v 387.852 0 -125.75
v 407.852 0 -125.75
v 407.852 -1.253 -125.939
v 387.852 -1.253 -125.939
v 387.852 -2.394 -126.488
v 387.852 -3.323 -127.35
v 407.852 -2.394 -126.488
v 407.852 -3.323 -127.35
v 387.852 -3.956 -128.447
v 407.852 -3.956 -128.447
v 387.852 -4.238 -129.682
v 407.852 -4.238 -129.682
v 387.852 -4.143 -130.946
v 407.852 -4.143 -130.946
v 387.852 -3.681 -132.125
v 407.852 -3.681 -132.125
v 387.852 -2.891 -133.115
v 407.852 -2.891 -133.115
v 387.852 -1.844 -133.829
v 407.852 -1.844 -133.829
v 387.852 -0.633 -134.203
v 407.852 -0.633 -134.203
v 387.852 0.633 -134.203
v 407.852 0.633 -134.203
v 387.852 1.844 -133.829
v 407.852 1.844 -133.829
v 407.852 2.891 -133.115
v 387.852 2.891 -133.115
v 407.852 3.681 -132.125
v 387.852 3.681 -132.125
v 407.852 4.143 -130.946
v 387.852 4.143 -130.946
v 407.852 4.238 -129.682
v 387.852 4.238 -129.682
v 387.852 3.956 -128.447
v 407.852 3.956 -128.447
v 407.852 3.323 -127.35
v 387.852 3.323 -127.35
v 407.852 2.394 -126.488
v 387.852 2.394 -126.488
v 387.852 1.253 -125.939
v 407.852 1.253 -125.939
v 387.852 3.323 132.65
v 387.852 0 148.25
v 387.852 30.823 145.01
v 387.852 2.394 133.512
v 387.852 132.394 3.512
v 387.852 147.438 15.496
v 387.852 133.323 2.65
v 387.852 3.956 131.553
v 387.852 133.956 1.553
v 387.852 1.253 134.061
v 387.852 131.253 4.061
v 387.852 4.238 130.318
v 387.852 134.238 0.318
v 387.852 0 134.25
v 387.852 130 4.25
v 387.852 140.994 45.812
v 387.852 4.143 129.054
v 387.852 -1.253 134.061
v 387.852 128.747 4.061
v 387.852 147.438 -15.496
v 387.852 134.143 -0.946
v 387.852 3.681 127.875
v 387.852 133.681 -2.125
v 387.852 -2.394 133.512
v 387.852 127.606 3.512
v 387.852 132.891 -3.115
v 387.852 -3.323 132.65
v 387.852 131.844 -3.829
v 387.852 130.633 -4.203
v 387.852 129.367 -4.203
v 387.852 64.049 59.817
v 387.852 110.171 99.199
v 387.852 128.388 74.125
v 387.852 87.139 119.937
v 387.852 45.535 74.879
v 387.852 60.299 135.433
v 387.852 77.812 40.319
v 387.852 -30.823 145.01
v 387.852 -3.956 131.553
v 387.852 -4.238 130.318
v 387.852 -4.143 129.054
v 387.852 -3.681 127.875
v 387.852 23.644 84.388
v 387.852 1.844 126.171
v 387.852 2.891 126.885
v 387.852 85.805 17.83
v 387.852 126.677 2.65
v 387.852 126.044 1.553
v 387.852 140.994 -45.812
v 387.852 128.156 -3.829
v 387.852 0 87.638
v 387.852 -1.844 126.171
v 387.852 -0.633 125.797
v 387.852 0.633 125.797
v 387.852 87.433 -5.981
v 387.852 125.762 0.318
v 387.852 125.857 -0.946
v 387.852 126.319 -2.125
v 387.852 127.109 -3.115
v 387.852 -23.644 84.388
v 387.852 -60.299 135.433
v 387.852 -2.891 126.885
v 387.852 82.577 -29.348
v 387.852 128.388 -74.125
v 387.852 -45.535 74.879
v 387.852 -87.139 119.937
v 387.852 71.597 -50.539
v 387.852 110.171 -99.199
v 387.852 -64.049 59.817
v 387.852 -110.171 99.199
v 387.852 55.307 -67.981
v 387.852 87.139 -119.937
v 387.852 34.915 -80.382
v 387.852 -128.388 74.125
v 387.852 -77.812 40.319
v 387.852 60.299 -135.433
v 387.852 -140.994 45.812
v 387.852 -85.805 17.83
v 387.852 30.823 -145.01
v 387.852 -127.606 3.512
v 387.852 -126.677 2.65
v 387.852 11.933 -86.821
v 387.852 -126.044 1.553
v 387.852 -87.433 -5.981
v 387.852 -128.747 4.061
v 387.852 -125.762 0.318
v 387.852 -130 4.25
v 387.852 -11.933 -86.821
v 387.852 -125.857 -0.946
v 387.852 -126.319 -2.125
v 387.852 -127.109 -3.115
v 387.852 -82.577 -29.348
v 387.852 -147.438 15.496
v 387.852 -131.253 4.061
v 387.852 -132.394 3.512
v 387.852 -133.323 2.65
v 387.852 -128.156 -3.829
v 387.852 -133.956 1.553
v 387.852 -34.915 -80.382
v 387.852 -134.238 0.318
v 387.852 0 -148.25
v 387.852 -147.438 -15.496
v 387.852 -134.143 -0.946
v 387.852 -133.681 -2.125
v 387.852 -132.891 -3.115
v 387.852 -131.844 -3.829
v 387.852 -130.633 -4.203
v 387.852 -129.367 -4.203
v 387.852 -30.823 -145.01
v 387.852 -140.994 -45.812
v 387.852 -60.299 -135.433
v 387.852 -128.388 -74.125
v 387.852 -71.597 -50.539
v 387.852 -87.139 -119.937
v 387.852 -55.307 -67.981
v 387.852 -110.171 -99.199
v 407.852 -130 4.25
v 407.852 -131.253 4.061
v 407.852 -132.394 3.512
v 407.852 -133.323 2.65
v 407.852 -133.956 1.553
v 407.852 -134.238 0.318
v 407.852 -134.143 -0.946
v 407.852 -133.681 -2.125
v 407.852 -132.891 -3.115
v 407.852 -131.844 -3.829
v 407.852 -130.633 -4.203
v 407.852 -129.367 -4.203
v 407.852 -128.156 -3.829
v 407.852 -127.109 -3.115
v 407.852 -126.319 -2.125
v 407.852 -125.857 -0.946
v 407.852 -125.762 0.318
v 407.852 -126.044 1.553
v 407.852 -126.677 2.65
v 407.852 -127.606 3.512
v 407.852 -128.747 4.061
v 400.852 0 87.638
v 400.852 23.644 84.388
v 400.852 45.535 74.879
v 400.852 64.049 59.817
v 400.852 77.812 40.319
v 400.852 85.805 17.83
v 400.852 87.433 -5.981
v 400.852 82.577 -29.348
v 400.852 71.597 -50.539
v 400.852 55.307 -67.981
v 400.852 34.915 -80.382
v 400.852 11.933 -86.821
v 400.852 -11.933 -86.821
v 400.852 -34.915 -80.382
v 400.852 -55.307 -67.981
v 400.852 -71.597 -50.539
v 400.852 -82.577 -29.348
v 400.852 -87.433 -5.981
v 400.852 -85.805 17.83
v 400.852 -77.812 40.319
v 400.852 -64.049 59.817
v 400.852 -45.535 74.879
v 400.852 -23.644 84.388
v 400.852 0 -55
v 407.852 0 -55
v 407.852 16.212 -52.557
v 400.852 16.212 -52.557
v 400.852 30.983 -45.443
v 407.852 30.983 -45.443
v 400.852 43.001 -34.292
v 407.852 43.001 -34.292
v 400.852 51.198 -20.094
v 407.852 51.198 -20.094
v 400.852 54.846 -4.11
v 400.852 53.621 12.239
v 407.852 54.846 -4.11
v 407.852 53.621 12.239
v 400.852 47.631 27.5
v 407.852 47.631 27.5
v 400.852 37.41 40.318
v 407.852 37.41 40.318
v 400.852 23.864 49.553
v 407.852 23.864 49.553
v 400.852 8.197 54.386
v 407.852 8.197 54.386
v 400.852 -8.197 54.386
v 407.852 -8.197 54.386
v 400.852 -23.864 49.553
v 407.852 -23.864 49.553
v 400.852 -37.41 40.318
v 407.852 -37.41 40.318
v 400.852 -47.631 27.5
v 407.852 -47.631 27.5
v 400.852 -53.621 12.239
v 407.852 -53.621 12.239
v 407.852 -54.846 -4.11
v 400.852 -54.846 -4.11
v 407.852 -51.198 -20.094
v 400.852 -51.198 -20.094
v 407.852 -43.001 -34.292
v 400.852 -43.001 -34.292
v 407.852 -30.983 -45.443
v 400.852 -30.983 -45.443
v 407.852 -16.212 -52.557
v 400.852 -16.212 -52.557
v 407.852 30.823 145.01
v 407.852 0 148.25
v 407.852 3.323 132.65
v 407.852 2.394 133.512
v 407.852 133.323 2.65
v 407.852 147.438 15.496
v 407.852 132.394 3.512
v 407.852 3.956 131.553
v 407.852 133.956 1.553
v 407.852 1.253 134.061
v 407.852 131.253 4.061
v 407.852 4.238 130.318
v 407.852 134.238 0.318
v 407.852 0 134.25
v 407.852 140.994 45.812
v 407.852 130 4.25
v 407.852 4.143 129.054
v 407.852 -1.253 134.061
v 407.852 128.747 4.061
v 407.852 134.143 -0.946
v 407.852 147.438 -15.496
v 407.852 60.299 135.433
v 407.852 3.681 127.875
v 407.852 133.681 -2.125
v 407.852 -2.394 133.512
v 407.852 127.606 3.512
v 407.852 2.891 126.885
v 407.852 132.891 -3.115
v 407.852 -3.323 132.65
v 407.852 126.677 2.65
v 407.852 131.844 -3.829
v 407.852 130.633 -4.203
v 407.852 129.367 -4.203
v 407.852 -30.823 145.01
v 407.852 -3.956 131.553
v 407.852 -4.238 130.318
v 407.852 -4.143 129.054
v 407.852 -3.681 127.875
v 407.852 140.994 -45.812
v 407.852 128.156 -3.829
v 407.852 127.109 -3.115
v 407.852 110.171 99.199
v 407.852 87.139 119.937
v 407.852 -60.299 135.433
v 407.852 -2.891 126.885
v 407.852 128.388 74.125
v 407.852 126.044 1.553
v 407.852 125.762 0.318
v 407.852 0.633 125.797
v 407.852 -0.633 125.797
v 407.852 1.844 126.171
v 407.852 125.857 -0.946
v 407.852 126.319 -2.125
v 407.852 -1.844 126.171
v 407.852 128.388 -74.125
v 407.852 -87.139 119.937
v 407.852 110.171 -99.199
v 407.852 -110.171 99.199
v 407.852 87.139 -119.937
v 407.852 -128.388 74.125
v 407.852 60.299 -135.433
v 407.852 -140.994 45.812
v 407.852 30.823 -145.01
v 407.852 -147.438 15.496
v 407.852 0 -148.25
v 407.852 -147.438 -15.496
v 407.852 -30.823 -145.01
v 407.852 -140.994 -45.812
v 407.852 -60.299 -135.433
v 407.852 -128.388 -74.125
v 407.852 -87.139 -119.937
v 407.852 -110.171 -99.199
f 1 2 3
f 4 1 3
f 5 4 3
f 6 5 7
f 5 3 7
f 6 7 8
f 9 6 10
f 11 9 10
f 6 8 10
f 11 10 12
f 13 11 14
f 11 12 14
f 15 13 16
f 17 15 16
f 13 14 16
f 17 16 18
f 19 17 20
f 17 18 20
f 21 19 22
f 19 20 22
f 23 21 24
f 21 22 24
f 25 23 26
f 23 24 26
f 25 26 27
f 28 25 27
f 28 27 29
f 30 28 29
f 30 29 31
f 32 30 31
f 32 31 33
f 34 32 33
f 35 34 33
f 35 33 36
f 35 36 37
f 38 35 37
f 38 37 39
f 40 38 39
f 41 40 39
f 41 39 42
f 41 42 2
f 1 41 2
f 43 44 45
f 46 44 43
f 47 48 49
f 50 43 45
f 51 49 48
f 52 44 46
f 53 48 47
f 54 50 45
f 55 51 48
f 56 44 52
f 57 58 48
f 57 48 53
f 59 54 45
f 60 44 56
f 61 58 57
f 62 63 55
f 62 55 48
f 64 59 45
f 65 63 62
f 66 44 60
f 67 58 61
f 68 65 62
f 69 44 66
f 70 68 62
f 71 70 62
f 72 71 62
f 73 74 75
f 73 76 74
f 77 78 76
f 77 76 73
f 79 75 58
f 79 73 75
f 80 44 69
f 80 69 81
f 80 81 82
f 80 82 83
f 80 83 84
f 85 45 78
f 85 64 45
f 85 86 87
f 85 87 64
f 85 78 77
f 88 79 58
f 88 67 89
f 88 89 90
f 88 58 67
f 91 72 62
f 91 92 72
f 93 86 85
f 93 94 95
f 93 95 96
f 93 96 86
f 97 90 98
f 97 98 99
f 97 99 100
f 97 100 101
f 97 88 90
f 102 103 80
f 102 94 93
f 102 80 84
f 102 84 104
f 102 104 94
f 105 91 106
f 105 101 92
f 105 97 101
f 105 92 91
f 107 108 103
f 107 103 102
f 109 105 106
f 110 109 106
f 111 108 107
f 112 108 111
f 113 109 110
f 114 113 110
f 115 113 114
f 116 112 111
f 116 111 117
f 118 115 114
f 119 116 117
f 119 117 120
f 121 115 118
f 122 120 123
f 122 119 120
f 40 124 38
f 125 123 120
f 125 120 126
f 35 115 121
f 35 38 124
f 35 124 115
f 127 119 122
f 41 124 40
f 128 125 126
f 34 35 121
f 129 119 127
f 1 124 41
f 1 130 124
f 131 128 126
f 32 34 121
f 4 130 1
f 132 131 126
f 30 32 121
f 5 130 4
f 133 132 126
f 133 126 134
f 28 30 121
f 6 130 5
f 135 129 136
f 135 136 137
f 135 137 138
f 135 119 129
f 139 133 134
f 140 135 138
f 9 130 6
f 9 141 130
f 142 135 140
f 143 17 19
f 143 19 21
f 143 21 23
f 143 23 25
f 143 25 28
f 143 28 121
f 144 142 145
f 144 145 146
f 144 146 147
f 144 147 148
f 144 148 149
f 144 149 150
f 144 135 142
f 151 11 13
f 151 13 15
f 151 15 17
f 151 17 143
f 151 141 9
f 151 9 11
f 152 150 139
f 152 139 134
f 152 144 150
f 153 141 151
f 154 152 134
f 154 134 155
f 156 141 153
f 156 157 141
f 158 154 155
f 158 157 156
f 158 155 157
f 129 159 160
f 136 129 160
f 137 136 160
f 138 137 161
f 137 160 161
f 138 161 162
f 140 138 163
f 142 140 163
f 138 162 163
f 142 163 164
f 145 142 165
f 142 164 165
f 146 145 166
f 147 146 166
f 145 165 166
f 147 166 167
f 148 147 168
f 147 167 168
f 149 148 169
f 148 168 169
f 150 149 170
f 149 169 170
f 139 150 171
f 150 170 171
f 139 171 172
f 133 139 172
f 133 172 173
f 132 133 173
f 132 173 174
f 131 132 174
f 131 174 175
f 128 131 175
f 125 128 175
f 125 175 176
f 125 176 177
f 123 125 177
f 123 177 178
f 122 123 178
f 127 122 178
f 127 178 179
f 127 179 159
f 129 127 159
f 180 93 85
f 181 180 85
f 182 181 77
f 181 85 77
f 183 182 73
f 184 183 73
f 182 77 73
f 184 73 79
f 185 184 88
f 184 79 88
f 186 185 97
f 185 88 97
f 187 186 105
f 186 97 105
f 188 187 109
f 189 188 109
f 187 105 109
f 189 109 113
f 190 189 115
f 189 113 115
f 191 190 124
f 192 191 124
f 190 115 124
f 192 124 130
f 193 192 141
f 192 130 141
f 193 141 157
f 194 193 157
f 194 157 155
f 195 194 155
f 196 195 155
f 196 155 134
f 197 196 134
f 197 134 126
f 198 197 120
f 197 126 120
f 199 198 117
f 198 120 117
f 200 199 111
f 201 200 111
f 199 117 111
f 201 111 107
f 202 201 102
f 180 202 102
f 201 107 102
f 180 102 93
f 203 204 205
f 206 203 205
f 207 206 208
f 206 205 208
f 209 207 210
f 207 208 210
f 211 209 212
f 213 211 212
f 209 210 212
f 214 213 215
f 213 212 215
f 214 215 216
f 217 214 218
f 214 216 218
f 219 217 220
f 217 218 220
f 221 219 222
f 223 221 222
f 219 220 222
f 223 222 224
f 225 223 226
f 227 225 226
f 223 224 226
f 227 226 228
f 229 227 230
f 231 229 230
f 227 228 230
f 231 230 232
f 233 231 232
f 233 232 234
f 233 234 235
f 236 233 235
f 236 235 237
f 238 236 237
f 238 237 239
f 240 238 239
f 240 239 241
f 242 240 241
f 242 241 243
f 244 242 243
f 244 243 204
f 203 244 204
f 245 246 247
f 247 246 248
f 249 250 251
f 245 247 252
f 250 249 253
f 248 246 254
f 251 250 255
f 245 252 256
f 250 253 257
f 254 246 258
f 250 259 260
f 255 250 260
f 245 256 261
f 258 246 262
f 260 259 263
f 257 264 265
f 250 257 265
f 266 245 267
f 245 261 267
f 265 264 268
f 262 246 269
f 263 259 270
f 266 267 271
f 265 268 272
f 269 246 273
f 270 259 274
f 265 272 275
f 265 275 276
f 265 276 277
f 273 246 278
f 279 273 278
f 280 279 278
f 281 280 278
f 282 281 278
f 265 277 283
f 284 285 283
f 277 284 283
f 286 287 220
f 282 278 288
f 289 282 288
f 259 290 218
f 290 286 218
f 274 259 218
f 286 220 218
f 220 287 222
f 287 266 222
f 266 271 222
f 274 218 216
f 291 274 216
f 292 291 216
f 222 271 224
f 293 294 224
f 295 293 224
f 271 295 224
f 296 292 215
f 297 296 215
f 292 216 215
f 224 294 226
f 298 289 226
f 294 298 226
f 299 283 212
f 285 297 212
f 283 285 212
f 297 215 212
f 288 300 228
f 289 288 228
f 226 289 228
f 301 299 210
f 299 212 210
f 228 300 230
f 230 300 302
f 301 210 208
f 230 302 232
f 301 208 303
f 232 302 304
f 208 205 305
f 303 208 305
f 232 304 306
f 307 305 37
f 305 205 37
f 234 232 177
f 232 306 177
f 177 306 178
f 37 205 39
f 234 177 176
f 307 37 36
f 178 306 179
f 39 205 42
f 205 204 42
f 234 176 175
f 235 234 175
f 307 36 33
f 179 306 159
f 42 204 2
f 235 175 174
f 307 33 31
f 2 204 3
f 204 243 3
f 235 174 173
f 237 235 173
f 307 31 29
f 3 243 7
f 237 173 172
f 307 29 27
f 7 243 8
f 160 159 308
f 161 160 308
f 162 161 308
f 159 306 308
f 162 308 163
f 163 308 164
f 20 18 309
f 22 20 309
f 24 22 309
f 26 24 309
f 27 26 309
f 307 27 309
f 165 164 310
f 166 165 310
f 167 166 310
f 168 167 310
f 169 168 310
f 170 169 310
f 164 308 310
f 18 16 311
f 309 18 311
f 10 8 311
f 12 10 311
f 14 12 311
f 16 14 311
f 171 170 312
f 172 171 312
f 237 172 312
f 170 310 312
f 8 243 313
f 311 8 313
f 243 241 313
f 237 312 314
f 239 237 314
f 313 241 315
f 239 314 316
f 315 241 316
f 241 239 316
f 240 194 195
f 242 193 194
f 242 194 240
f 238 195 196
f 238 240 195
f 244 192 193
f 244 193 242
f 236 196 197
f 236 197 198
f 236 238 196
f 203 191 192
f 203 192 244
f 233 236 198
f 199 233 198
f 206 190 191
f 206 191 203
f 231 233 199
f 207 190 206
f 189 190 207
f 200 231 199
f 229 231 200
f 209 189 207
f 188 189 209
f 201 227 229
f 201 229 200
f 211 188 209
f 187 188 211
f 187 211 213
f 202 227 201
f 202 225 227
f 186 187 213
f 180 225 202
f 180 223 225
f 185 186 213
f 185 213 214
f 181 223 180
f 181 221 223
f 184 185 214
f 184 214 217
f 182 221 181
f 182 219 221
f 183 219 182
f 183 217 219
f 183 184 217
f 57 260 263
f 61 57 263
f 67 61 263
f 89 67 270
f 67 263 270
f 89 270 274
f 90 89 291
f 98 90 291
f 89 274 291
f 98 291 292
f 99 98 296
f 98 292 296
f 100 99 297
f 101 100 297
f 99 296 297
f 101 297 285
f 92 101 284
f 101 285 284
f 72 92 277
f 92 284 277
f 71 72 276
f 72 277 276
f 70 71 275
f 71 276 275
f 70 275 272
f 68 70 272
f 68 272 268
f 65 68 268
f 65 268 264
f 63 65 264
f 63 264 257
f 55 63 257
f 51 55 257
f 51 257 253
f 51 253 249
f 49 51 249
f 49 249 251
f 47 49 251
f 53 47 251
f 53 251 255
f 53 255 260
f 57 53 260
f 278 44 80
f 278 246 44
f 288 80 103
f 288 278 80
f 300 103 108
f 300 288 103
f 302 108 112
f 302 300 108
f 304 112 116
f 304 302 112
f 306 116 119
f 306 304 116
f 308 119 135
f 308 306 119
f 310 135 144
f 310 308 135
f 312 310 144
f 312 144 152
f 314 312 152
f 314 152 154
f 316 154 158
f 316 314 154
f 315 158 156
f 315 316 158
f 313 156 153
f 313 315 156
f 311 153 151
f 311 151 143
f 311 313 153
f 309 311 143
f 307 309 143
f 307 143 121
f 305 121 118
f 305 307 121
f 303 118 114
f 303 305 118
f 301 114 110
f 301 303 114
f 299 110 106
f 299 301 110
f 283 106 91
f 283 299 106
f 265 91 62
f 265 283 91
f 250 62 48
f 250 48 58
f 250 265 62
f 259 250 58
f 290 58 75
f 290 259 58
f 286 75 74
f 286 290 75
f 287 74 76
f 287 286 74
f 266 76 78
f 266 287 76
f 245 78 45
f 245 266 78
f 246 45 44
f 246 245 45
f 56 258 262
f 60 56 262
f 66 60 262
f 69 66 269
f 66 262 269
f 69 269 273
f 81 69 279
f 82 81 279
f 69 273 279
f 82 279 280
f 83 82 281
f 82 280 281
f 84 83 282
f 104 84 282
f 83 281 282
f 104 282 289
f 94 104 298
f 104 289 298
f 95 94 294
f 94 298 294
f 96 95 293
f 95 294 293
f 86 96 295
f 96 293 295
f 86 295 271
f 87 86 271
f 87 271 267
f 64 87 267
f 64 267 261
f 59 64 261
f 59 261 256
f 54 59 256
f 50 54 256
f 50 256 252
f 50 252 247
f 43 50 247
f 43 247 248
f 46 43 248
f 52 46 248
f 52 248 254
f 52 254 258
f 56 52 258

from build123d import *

# Parameters (mm, degrees)
ESQUISSE1_W             = 20
ESQUISSE1_H             = 148.25
ESQUISSE2_R             = 55
ENL_V_MAT_EXTRU_1_DEPTH = 211.608938557
ESQUISSE3_R             = 87.63760146
ENL_V_MAT_EXTRU_2_DEPTH = 13
TROU_TARAUD_M101_D      = 8.5


with BuildPart() as part:
    # Esquisse1 → Révolution1 (revolve)
    with BuildSketch(Plane.XY, mode=Mode.PRIVATE) as r_volution1_sk:
        with Locations((397.851746626, 74.125)):
            Rectangle(ESQUISSE1_W, ESQUISSE1_H)
    revolve(r_volution1_sk.sketch.rotate(Axis((22.672384616, 0, 0), (1, 0, 0)), 90), axis=Axis((22.672384616, 0, 0), (1, 0, 0)))

    # Esquisse2 → Enlèv. mat.-Extru.1 (cut, through all)
    with BuildSketch(Plane(origin=(407.851746626, 0, 0), x_dir=(0, 0, -1), z_dir=(1, 0, 0))):
        Circle(ESQUISSE2_R)
    extrude(amount=-ENL_V_MAT_EXTRU_1_DEPTH, mode=Mode.SUBTRACT)

    # Esquisse3 → Enlèv. mat.-Extru.2 (cut)
    with BuildSketch(Plane.ZY.offset(-387.851746626)):
        Circle(ESQUISSE3_R)
    extrude(amount=-ENL_V_MAT_EXTRU_2_DEPTH, mode=Mode.SUBTRACT)

    # Trou taraudé M101 (through all)
    with Locations(Plane(origin=(387.851746626, 130, 0), x_dir=(0, 0, -1), z_dir=(-1, 0, 0))):
        with Locations((0, 0), (130, 130), (0, 260), (-130, 130)):
            Hole(TROU_TARAUD_M101_D / 2)


solid = part.part
